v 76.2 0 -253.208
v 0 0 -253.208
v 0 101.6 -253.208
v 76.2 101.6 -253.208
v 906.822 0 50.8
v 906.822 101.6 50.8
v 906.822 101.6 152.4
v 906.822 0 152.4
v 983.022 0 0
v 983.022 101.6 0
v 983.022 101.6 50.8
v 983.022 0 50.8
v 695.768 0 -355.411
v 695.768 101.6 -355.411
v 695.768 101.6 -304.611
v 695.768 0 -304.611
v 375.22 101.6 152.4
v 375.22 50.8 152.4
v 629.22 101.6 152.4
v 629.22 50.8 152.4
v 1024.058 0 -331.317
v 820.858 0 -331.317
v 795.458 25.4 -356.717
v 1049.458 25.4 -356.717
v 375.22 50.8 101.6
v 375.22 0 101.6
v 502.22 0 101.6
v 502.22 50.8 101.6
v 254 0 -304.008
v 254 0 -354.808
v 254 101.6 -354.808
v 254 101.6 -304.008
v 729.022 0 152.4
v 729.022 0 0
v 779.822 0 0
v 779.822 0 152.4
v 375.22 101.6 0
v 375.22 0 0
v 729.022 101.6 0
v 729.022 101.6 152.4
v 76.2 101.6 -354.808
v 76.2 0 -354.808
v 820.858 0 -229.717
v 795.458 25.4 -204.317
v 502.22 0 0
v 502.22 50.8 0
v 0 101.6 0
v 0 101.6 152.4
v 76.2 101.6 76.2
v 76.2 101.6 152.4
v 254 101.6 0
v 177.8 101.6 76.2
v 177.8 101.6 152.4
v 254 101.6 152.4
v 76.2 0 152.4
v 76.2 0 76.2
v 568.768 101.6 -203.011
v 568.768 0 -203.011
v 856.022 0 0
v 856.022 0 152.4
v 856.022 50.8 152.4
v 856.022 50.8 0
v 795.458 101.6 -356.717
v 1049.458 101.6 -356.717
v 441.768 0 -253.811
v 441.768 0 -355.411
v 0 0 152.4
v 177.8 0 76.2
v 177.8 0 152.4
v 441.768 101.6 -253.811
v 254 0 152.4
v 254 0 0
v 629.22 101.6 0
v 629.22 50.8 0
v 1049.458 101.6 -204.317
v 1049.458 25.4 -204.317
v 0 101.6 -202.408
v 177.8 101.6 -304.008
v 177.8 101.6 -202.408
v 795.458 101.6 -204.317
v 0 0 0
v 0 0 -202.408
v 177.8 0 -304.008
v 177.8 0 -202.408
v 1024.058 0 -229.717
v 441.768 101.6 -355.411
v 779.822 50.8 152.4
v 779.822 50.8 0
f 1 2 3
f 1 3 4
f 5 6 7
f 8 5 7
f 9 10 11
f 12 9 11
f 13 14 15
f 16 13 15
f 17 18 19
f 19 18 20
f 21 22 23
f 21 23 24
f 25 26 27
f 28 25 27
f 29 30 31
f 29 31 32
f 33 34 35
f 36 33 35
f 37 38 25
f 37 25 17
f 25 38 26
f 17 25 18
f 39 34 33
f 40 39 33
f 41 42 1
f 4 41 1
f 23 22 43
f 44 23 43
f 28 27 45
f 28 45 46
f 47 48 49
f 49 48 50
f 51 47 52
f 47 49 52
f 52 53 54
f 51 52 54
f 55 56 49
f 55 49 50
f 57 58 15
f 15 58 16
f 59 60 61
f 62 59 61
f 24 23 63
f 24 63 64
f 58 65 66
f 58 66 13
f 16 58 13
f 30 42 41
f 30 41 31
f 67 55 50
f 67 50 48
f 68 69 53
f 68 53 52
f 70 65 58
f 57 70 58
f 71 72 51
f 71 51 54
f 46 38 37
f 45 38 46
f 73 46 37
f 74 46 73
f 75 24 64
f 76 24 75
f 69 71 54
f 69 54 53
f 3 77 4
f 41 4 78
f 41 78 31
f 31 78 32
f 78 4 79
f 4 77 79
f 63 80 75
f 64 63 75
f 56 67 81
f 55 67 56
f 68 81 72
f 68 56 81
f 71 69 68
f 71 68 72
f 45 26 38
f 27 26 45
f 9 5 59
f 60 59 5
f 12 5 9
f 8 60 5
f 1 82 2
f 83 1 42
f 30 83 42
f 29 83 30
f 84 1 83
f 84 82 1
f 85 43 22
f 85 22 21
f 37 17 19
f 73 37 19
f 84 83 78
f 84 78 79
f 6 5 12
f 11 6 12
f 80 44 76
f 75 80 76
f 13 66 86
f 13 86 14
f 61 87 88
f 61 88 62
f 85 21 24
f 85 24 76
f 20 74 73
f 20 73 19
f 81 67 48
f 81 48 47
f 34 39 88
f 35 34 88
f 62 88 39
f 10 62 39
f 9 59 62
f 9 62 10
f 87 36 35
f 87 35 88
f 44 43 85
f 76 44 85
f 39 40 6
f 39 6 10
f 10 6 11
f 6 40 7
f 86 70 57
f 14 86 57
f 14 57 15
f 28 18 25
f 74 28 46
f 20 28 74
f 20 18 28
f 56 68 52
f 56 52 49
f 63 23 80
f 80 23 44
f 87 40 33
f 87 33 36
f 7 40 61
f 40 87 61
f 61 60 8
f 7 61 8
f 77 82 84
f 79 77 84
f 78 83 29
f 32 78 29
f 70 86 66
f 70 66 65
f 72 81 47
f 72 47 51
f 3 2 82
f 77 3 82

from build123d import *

# Parameters (mm, degrees)
F1_DEPTH  = 101.6
F2_W      = 254
F2_H      = 152.4
F3_DEPTH  = 101.6
F4_W      = 127
F4_H      = 50.8
F5_DEPTH  = 152.4
F6_W      = 127
F6_H      = 50.8
F7_DEPTH  = 50.8
F8_W      = 254
F8_H      = 152.4
F9_DEPTH  = 101.6
F10_W     = 76.2
F10_H     = 101.6
F11_DEPTH = 101.6
F12_W     = 76.2
F12_H     = 50.8
F13_DEPTH = 152.4
F14_W     = 254
F14_H     = 152.4
F15_DEPTH = 101.6
F16_W     = 76.2
F16_H     = 101.6
F17_DEPTH = 101.6
F18_W     = 76.2
F18_H     = 101.6
F19_DEPTH = 101.6
F20_W     = 254
F20_H     = 152.4
F21_DEPTH = 101.6
F23_DEPTH = 101.6
F25_DEPTH = 101.6
F26_W     = 254
F26_H     = 152.4
F27_DEPTH = 101.6
F28_SIZE  = 25.4


with BuildPart() as f1:
    # F0 (on Front) → F1 (new body)
    with BuildSketch(Plane.XZ):
        Polygon((0, 152.4), (0, 0), (254, 0), (254, 152.4), (177.8, 152.4), (177.8, 76.2), (76.2, 76.2), (76.2, 152.4), align=None)
    extrude(amount=-F1_DEPTH)


with BuildPart() as f3:
    # F2 (on Front) → F3 (new body)
    with BuildSketch(Plane.XZ):
        with Locations((502.219941, 76.2)):
            Rectangle(F2_W, F2_H)
    extrude(amount=-F3_DEPTH)

    # F4 (on face) → F5 (cut)
    with BuildSketch(Plane.XY.offset(152.4)):
        with Locations((565.719941, 25.4)):
            Rectangle(F4_W, F4_H)
    extrude(amount=-F5_DEPTH, mode=Mode.SUBTRACT)

    # F6 (on face) → F7 (cut)
    with BuildSketch(Plane.XZ):
        with Locations((438.719941, 127)):
            Rectangle(F6_W, F6_H)
    extrude(amount=-F7_DEPTH, mode=Mode.SUBTRACT)


with BuildPart() as f9:
    # F8 (on Front) → F9 (new body)
    with BuildSketch(Plane.XZ):
        with Locations((856.021728, 76.2)):
            Rectangle(F8_W, F8_H)
    extrude(amount=-F9_DEPTH)

    # F10 (on face) → F11 (cut)
    with BuildSketch(Plane.XZ):
        with Locations((944.921728, 101.6)):
            Rectangle(F10_W, F10_H)
    extrude(amount=-F11_DEPTH, mode=Mode.SUBTRACT)

    # F12 (on face) → F13 (cut)
    with BuildSketch(Plane.XY.offset(152.4)):
        with Locations((817.921728, 25.4)):
            Rectangle(F12_W, F12_H)
    extrude(amount=-F13_DEPTH, mode=Mode.SUBTRACT)


with BuildPart() as f15:
    # F14 (on Front) → F15 (new body)
    with BuildSketch(Plane.XZ):
        with Locations((127, -278.608005)):
            Rectangle(F14_W, F14_H)
    extrude(amount=-F15_DEPTH)

    # F16 (on face) → F17 (cut)
    with BuildSketch(Plane.XZ):
        with Locations((38.1, -304.008005)):
            Rectangle(F16_W, F16_H)
    extrude(amount=-F17_DEPTH, mode=Mode.SUBTRACT)

    # F18 (on face) → F19 (cut)
    with BuildSketch(Plane.XZ):
        with Locations((215.9, -253.208005)):
            Rectangle(F18_W, F18_H)
    extrude(amount=-F19_DEPTH, mode=Mode.SUBTRACT)


with BuildPart() as f21:
    # F20 (on Front) → F21 (new body)
    with BuildSketch(Plane.XZ):
        with Locations((568.767503, -279.210531)):
            Rectangle(F20_W, F20_H)
    extrude(amount=-F21_DEPTH)

    # F22 (on face) → F23 (cut)
    with BuildSketch(Plane.XZ):
        Polygon((441.767503, -203.010531), (441.767503, -253.810531), (568.767503, -203.010531), align=None)
    extrude(amount=-F23_DEPTH, mode=Mode.SUBTRACT)

    # F24 (on face) → F25 (cut)
    with BuildSketch(Plane.XZ):
        Polygon((568.767503, -203.010531), (695.767503, -304.610531), (695.767503, -203.010531), align=None)
    extrude(amount=-F25_DEPTH, mode=Mode.SUBTRACT)


with BuildPart() as f27:
    # F26 (on Front) → F27 (new body)
    with BuildSketch(Plane.XZ):
        with Locations((922.458179, -280.516855)):
            Rectangle(F26_W, F26_H)
    extrude(amount=-F27_DEPTH)

    # F28
    f28_edges = [f27.edges().sort_by_distance(p)[0] for p in [
        (922.458179, 0, -204.316855),
        (1049.458179, 0, -280.516855),
        (922.458179, 0, -356.716855),
        (795.458179, 0, -280.516855),
    ]]
    chamfer(f28_edges, length=F28_SIZE)


solid = Compound([f1.part, f3.part, f9.part, f15.part, f21.part, f27.part])
